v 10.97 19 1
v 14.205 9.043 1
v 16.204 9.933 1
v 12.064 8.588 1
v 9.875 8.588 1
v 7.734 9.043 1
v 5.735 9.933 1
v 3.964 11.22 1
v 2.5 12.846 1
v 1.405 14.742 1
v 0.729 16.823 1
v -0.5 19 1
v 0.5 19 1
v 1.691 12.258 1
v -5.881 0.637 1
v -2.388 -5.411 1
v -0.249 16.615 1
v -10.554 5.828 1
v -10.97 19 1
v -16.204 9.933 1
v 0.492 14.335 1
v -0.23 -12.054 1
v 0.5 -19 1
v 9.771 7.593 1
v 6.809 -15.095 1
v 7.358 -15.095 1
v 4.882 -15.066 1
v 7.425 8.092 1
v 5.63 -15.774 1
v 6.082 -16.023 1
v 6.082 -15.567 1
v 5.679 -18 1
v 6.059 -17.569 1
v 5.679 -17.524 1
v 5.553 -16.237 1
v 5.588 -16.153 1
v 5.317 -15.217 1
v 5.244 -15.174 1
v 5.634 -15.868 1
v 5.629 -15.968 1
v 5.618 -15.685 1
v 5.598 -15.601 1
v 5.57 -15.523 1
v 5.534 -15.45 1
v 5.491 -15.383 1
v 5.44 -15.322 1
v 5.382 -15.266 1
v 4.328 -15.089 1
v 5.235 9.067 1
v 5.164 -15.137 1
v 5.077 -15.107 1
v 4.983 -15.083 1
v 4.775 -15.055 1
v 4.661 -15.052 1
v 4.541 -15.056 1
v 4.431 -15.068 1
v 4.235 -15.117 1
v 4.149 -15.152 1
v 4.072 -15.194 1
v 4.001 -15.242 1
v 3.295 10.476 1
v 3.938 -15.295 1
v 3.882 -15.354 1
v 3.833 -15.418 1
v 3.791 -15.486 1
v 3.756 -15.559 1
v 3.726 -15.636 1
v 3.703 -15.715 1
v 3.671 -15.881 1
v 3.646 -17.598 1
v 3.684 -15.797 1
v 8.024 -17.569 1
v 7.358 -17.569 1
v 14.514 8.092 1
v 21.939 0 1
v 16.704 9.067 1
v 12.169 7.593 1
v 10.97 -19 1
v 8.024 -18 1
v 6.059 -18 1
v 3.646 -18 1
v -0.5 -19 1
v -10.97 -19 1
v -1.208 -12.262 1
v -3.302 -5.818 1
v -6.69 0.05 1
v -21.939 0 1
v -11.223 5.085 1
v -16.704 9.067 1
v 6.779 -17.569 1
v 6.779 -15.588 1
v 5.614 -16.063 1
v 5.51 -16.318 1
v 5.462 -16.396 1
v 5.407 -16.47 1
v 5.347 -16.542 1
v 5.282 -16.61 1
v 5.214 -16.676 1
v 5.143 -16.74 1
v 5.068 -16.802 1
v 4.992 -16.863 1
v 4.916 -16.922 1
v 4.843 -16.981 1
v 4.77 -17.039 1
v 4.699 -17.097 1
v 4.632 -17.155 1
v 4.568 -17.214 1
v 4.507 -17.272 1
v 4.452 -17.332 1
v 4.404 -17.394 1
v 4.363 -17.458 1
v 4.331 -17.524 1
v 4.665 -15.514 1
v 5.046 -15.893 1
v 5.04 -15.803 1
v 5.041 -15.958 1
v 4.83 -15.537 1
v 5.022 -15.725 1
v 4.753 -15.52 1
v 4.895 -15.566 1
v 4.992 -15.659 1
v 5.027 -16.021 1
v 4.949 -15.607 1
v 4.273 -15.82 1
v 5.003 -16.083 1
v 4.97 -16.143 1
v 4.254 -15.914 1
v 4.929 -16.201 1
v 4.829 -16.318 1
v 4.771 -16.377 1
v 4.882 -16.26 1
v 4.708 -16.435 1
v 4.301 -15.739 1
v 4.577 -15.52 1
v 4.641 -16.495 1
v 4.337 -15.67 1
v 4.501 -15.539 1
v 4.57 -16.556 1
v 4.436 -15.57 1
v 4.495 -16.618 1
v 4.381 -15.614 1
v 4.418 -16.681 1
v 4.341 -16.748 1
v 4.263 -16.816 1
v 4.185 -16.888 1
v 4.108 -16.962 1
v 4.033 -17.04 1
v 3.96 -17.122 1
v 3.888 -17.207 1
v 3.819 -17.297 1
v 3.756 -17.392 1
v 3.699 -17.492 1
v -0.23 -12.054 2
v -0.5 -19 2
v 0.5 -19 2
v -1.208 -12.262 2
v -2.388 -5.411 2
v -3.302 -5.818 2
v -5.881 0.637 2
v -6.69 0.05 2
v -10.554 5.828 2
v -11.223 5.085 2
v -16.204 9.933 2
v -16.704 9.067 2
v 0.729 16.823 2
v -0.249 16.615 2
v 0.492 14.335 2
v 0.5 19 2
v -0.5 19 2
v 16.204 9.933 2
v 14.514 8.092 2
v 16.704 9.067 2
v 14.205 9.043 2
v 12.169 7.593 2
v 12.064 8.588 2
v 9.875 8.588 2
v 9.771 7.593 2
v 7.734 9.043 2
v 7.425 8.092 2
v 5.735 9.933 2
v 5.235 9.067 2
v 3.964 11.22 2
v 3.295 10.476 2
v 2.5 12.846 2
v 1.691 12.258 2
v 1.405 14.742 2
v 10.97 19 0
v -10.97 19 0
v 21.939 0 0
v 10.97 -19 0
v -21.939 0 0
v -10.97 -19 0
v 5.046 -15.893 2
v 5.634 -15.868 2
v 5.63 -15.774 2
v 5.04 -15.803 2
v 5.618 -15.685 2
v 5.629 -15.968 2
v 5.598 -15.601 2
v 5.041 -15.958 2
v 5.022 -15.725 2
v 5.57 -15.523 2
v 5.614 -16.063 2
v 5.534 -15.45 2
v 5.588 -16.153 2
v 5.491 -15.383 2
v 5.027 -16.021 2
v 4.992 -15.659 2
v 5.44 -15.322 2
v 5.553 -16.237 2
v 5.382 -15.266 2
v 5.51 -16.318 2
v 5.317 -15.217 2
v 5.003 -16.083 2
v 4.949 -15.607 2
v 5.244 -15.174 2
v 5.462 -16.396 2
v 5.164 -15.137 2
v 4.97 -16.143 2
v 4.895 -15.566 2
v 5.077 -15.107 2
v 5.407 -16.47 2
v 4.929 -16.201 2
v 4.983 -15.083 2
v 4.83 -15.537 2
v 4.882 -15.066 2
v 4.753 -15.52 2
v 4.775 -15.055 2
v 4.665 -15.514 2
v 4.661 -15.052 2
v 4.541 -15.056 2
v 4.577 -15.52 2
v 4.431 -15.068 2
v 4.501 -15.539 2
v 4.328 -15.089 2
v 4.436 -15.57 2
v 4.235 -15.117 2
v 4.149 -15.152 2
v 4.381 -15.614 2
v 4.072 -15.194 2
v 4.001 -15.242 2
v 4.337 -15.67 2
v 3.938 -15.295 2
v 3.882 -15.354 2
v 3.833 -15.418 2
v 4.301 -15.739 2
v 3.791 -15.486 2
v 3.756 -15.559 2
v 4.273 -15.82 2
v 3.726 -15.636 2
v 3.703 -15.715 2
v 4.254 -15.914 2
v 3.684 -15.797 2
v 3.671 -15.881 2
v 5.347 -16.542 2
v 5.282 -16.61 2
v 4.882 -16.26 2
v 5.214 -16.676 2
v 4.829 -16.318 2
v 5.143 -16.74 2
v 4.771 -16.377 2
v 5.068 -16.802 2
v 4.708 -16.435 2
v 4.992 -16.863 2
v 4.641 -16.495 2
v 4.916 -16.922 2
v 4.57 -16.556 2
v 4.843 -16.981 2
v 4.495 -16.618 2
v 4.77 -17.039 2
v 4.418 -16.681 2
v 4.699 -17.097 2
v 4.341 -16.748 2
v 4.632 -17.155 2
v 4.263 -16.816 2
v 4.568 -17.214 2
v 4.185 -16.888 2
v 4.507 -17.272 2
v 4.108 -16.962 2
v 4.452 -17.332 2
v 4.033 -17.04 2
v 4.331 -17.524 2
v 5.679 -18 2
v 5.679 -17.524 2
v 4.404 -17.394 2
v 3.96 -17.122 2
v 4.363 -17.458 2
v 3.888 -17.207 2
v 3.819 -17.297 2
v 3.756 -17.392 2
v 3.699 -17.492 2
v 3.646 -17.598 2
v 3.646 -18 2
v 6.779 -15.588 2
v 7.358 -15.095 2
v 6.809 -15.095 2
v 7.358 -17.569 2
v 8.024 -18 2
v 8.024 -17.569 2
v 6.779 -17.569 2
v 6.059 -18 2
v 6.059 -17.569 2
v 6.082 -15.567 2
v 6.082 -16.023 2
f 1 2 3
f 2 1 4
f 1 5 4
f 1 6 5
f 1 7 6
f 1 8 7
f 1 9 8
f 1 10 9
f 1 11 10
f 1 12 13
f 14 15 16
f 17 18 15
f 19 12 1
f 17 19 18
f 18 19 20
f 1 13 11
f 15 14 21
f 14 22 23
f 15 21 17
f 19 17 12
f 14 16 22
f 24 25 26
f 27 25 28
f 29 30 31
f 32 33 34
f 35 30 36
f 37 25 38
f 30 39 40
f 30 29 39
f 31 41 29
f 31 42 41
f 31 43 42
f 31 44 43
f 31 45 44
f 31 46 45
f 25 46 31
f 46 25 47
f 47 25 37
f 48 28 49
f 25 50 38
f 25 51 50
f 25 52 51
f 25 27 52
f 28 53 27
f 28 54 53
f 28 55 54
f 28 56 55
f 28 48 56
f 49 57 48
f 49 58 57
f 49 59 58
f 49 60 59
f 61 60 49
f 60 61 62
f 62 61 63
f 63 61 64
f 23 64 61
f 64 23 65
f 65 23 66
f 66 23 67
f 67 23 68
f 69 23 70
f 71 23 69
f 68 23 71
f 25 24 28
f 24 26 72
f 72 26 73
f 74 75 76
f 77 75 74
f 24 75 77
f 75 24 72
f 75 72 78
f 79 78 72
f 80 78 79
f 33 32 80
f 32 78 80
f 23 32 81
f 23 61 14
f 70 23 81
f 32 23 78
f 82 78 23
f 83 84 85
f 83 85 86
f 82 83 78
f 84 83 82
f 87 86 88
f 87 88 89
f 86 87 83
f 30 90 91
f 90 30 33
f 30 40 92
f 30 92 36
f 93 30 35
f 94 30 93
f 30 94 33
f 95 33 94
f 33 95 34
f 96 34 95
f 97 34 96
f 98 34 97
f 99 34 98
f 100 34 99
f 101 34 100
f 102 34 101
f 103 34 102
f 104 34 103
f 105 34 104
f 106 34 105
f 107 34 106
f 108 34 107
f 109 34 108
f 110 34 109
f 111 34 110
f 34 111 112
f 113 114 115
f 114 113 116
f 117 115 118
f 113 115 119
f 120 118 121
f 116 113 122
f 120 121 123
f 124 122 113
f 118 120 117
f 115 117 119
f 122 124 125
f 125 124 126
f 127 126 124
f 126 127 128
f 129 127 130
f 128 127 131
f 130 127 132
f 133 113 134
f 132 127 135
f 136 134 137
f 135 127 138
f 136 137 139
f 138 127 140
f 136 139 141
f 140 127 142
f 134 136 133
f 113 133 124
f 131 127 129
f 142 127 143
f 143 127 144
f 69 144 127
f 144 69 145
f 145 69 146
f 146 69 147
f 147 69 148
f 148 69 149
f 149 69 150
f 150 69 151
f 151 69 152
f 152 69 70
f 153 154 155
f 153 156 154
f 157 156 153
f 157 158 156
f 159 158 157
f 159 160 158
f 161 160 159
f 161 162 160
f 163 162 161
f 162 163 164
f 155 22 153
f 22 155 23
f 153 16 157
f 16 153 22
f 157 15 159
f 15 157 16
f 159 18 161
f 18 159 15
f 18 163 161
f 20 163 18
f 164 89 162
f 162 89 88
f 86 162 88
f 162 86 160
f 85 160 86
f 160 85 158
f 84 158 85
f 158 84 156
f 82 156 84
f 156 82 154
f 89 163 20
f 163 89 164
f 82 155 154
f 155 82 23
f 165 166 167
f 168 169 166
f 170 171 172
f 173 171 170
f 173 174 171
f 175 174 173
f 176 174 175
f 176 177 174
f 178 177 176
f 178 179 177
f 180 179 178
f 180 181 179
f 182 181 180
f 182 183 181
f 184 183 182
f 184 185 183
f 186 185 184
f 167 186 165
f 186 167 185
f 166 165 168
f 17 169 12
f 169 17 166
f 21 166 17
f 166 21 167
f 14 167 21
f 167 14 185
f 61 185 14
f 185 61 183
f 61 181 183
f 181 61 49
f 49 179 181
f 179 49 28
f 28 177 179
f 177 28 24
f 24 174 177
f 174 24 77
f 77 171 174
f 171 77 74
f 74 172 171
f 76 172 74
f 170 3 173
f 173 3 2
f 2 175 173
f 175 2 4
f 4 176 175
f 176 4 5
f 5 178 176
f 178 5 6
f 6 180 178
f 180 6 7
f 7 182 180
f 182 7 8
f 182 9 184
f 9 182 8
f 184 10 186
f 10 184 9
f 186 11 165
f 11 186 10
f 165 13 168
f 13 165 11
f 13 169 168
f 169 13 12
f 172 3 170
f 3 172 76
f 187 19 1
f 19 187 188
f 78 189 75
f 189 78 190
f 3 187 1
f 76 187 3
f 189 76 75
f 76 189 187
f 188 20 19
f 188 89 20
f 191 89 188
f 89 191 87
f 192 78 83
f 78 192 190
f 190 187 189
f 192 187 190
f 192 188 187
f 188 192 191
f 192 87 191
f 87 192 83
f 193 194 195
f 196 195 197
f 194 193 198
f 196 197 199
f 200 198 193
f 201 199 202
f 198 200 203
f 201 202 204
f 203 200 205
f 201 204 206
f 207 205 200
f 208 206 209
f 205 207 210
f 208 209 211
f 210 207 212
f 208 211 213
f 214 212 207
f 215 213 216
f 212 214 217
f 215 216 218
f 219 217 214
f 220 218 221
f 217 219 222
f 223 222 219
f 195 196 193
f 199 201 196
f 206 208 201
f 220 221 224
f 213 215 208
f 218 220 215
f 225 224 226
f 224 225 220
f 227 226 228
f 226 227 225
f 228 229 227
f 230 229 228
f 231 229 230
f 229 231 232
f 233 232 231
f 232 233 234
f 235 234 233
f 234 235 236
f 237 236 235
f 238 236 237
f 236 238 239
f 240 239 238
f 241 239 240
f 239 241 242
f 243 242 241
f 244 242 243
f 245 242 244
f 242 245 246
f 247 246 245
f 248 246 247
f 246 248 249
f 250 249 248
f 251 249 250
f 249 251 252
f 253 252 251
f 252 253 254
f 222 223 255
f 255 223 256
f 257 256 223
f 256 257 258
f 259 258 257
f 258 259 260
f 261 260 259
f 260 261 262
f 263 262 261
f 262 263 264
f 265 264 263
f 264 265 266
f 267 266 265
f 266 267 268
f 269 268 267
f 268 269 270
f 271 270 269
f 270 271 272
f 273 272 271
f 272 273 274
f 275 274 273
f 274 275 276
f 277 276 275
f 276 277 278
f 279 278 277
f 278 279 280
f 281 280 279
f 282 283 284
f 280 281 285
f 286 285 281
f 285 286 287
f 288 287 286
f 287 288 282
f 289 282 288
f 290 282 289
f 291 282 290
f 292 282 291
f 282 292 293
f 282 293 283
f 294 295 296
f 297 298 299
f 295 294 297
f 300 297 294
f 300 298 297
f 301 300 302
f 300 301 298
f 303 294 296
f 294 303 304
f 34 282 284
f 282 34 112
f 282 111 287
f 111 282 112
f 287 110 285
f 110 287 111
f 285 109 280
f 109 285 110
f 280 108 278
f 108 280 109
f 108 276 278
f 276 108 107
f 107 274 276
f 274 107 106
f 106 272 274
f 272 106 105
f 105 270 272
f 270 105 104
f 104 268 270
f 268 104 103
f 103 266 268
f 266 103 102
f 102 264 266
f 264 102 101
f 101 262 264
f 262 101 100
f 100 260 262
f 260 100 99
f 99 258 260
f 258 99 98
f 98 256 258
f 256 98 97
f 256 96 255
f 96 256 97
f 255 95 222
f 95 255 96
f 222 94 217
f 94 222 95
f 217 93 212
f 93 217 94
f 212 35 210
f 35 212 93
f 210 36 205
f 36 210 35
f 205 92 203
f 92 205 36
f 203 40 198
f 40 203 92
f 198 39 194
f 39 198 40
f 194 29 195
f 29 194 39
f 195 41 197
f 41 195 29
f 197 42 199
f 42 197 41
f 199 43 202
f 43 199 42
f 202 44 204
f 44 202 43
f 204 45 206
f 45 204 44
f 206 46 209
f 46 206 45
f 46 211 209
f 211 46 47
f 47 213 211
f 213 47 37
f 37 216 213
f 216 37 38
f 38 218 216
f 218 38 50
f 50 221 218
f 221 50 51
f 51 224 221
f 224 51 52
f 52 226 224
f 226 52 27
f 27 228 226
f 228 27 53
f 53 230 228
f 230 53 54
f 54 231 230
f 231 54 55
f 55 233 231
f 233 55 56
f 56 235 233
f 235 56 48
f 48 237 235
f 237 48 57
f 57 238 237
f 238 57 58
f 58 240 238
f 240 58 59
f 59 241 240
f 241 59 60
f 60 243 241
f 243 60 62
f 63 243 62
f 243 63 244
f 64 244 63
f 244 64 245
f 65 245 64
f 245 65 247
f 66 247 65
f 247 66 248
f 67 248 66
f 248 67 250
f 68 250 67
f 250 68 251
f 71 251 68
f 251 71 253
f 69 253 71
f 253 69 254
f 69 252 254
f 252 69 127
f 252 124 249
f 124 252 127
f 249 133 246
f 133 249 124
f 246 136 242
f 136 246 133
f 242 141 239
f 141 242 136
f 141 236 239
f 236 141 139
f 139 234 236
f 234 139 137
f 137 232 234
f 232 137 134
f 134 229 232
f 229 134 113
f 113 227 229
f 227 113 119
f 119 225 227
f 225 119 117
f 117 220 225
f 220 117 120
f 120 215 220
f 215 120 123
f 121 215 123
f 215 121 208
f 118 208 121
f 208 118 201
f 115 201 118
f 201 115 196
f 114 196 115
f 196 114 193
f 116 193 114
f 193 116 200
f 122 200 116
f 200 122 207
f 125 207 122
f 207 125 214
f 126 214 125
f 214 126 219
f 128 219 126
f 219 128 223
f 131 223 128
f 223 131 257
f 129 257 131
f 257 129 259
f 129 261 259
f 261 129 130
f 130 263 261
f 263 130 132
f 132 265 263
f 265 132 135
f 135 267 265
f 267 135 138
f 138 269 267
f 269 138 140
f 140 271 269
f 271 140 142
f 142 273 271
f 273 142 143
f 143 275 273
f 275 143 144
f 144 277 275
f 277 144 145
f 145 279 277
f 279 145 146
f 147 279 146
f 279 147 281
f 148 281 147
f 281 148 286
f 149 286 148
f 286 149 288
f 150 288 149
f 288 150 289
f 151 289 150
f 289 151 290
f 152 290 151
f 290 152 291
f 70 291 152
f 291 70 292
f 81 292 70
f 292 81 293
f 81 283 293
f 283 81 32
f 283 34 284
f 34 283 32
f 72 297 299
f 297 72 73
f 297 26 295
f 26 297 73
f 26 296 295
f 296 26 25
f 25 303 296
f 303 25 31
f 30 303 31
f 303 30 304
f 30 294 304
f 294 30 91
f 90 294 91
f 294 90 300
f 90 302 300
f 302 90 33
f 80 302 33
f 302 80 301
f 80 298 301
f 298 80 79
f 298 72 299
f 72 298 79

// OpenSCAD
include <../Scripts/18xx tiles basic functions.scad>
hex("Green");
put_tilenr("21");
light_curve(r=4);
sharp_curve(r=2);
